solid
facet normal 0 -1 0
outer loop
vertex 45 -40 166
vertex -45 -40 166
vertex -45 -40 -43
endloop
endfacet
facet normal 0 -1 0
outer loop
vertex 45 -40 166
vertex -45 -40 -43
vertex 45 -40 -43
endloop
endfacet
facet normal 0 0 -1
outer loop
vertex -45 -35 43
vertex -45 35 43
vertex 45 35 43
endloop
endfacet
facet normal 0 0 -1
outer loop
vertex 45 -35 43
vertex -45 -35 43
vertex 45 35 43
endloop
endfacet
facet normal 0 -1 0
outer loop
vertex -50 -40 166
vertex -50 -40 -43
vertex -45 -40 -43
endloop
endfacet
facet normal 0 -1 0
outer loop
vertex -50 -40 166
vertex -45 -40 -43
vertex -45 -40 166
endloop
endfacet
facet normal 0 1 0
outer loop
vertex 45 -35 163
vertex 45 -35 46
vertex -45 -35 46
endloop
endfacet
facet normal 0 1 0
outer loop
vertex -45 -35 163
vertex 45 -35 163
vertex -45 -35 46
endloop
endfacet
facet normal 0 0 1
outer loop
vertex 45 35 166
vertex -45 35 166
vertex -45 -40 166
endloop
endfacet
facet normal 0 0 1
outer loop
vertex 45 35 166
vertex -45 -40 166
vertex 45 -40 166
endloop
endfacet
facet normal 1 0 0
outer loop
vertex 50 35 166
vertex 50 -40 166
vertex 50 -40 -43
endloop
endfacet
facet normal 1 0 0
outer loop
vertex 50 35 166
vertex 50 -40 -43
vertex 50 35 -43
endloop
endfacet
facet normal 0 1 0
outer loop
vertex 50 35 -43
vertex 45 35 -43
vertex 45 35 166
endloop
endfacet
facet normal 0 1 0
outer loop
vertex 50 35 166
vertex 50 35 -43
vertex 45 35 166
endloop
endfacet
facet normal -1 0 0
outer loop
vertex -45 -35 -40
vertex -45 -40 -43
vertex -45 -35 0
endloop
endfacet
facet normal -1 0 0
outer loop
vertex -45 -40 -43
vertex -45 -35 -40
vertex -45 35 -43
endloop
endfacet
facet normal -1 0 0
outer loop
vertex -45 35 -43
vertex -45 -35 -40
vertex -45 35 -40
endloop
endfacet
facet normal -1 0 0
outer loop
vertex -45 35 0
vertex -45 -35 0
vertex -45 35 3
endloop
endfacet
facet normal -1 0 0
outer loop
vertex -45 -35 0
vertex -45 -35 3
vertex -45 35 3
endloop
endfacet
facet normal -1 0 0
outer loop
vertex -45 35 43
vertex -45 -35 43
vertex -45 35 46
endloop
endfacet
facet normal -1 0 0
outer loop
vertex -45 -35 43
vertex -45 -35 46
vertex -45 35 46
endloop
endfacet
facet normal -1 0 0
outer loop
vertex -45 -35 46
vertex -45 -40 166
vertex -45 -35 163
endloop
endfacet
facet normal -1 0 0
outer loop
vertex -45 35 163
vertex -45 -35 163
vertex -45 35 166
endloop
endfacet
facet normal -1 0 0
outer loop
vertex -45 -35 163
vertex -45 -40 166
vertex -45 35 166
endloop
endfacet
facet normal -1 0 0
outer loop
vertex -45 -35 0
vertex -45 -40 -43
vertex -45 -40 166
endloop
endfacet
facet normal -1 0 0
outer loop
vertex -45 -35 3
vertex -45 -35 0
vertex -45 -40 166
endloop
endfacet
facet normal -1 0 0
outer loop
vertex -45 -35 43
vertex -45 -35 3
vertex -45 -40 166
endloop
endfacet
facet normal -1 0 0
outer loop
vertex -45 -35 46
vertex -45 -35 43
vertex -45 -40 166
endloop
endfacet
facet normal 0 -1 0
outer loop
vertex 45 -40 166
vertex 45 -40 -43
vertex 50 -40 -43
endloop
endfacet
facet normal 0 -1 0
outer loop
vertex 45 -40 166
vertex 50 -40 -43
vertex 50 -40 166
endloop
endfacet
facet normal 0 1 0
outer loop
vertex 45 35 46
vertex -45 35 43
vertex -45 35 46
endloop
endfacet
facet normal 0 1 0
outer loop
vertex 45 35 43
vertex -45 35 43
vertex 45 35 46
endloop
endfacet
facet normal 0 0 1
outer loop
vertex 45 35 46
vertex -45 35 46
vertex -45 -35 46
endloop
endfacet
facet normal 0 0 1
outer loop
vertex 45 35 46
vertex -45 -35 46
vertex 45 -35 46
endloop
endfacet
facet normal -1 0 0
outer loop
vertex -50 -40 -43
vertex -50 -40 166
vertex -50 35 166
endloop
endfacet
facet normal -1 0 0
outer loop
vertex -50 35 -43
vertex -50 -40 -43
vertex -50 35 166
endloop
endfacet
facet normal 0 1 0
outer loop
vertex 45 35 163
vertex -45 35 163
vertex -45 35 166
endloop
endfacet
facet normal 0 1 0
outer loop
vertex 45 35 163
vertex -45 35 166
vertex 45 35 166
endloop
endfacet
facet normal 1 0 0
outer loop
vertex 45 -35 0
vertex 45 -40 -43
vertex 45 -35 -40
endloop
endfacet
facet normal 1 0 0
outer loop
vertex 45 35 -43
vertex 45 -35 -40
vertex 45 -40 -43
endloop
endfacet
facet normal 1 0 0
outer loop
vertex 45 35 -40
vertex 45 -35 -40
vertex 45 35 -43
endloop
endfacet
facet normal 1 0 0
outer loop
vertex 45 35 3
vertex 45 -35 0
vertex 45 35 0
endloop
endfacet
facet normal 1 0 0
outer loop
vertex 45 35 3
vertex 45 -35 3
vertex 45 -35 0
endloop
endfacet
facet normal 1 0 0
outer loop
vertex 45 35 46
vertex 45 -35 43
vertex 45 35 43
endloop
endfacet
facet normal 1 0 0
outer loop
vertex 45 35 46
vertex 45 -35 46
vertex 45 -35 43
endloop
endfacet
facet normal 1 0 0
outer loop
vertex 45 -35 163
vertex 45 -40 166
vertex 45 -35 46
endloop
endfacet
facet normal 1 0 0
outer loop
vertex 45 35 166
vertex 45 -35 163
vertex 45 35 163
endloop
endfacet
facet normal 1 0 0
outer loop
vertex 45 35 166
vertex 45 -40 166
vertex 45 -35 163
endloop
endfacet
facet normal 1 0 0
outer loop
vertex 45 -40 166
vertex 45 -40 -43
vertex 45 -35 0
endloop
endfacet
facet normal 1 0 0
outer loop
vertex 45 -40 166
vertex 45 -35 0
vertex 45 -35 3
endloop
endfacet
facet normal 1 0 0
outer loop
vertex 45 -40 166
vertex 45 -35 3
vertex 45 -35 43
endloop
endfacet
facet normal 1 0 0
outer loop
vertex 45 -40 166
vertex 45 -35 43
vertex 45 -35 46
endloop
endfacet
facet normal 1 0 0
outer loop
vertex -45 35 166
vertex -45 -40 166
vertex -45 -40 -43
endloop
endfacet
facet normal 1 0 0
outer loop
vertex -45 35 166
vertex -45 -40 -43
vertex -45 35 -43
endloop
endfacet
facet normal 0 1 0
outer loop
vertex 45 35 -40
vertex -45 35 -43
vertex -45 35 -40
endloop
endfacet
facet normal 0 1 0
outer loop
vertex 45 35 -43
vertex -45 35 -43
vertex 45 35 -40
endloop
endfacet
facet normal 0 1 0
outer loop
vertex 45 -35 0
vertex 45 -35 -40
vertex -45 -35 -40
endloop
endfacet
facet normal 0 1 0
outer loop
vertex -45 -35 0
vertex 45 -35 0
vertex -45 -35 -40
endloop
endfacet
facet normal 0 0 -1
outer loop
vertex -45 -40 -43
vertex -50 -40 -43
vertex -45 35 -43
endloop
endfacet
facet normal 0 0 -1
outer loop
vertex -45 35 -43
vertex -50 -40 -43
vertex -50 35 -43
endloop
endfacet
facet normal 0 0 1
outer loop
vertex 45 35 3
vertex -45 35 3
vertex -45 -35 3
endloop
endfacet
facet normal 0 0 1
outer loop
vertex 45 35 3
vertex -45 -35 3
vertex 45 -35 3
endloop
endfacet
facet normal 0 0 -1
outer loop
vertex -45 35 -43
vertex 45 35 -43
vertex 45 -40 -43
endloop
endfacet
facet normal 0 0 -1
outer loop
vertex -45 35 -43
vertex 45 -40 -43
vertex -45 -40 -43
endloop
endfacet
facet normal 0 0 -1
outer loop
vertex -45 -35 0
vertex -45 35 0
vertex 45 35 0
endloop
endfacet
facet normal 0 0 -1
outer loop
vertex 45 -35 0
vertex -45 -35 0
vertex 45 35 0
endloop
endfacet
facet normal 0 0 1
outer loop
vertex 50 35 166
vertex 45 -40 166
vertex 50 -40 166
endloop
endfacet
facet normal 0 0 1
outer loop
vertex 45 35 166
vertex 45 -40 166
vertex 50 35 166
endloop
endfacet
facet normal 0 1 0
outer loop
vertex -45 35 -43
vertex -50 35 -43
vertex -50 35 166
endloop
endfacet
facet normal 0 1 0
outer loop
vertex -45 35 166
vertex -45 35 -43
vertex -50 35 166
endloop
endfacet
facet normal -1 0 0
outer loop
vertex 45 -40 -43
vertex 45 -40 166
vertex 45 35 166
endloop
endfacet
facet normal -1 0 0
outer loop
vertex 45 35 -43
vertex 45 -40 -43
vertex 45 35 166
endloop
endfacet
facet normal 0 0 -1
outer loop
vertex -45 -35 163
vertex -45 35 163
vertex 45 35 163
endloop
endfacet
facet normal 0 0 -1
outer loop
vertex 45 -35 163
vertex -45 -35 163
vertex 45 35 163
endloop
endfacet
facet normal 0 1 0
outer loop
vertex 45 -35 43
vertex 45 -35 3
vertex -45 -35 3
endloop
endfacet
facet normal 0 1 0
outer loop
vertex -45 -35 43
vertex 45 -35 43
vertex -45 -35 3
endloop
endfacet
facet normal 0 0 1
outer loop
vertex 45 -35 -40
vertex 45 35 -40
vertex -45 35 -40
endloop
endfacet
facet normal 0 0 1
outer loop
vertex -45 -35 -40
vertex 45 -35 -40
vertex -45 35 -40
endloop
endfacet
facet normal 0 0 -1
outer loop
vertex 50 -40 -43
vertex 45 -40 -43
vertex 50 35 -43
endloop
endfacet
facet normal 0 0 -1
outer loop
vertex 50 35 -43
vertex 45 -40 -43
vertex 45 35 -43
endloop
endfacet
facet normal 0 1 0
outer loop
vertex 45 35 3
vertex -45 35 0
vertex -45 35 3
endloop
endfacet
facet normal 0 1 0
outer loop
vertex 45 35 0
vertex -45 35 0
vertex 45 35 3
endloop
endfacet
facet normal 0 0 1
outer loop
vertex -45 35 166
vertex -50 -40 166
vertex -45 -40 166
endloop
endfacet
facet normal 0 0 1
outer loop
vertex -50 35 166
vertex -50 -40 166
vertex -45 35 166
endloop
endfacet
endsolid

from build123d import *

# Parameters (mm, degrees)
BOSS_EXTRUDE2_DEPTH      = 163
BOSS_EXTRUDE2_DEPTH_BACK = 40
SKETCH1_3_W              = 90
SKETCH1_3_H              = 70
BOSS_EXTRUDE3_DEPTH      = 3
SKETCH2_W                = 90
SKETCH2_H                = 70
BOSS_EXTRUDE4_DEPTH      = 3
SKETCH4_W                = 100
SKETCH4_H                = 75
BOSS_EXTRUDE6_DEPTH      = 3
SKETCH6_W                = 100
SKETCH6_H                = 75
BOSS_EXTRUDE7_DEPTH      = 3
SPLIT1_START             = -50
SPLIT1_OUTLINE_W         = 75
SPLIT1_OUTLINE_H         = 209
SPLIT1_DEPTH             = 5
SPLIT1_2_OUTLINE_W       = 75
SPLIT1_2_OUTLINE_H       = 209
SPLIT1_2_DEPTH           = 5
SPLIT1_START_2           = 45
SPLIT1_3_OUTLINE_W       = 75
SPLIT1_3_OUTLINE_H       = 209
SPLIT1_3_DEPTH           = 5
SPLIT1_4_OUTLINE_W       = 75
SPLIT1_4_OUTLINE_H       = 209
SPLIT1_4_DEPTH           = 5


# Read off the part's stored shape, not the designer's step: Split1
with BuildPart() as part:
    # Sketch1 → Boss-Extrude2 (new, two sides: drawn at the far end of the back side and taken through both)
    with BuildSketch(Plane.XY.offset(-BOSS_EXTRUDE2_DEPTH_BACK)):
        Polygon((-45, -35), (-45, 35), (-50, 35), (-50, -40), (50, -40), (50, 35), (45, 35), (45, -35), align=None)
    extrude(amount=BOSS_EXTRUDE2_DEPTH + BOSS_EXTRUDE2_DEPTH_BACK)

    # Sketch1<3> → Boss-Extrude3 (add)
    with BuildSketch(Plane.XY):
        Rectangle(SKETCH1_3_W, SKETCH1_3_H)
    extrude(amount=BOSS_EXTRUDE3_DEPTH)

    # Sketch2 → Boss-Extrude4 (add)
    with BuildSketch(Plane.XY.offset(43)):
        Rectangle(SKETCH2_W, SKETCH2_H)
    extrude(amount=BOSS_EXTRUDE4_DEPTH)

    # Sketch4 → Boss-Extrude6 (add)
    with BuildSketch(Plane(origin=(0, 0, -40), x_dir=(-1, 0, 0), z_dir=(0, 0, -1))):
        with Locations((0, -2.5)):
            Rectangle(SKETCH4_W, SKETCH4_H)
    extrude(amount=BOSS_EXTRUDE6_DEPTH)

    # Sketch6 → Boss-Extrude7 (add)
    with BuildSketch(Plane.XY.offset(163)):
        with Locations((0, -2.5)):
            Rectangle(SKETCH6_W, SKETCH6_H)
    extrude(amount=BOSS_EXTRUDE7_DEPTH)

    # Split1 2 outline → Split1 2 (cut)
    with BuildSketch(Plane.YZ.offset(SPLIT1_START)):
        with Locations((-2.5, 61.5)):
            Rectangle(SPLIT1_2_OUTLINE_W, SPLIT1_2_OUTLINE_H)
    extrude(amount=SPLIT1_2_DEPTH, mode=Mode.SUBTRACT)

    # Split1 3 outline → Split1 3 (cut)
    with BuildSketch(Plane.YZ.offset(SPLIT1_START_2)):
        with Locations((-2.5, 61.5)):
            Rectangle(SPLIT1_3_OUTLINE_W, SPLIT1_3_OUTLINE_H)
    extrude(amount=SPLIT1_3_DEPTH, mode=Mode.SUBTRACT)


with BuildPart() as body_2:
    # Split1 outline → Split1 (new body)
    with BuildSketch(Plane.YZ.offset(SPLIT1_START)):
        with Locations((-2.5, 61.5)):
            Rectangle(SPLIT1_OUTLINE_W, SPLIT1_OUTLINE_H)
    extrude(amount=SPLIT1_DEPTH)


with BuildPart() as body_3:
    # Split1 4 outline → Split1 4 (new body)
    with BuildSketch(Plane.YZ.offset(SPLIT1_START_2)):
        with Locations((-2.5, 61.5)):
            Rectangle(SPLIT1_4_OUTLINE_W, SPLIT1_4_OUTLINE_H)
    extrude(amount=SPLIT1_4_DEPTH)


solid = Compound([part.part, body_2.part, body_3.part])
